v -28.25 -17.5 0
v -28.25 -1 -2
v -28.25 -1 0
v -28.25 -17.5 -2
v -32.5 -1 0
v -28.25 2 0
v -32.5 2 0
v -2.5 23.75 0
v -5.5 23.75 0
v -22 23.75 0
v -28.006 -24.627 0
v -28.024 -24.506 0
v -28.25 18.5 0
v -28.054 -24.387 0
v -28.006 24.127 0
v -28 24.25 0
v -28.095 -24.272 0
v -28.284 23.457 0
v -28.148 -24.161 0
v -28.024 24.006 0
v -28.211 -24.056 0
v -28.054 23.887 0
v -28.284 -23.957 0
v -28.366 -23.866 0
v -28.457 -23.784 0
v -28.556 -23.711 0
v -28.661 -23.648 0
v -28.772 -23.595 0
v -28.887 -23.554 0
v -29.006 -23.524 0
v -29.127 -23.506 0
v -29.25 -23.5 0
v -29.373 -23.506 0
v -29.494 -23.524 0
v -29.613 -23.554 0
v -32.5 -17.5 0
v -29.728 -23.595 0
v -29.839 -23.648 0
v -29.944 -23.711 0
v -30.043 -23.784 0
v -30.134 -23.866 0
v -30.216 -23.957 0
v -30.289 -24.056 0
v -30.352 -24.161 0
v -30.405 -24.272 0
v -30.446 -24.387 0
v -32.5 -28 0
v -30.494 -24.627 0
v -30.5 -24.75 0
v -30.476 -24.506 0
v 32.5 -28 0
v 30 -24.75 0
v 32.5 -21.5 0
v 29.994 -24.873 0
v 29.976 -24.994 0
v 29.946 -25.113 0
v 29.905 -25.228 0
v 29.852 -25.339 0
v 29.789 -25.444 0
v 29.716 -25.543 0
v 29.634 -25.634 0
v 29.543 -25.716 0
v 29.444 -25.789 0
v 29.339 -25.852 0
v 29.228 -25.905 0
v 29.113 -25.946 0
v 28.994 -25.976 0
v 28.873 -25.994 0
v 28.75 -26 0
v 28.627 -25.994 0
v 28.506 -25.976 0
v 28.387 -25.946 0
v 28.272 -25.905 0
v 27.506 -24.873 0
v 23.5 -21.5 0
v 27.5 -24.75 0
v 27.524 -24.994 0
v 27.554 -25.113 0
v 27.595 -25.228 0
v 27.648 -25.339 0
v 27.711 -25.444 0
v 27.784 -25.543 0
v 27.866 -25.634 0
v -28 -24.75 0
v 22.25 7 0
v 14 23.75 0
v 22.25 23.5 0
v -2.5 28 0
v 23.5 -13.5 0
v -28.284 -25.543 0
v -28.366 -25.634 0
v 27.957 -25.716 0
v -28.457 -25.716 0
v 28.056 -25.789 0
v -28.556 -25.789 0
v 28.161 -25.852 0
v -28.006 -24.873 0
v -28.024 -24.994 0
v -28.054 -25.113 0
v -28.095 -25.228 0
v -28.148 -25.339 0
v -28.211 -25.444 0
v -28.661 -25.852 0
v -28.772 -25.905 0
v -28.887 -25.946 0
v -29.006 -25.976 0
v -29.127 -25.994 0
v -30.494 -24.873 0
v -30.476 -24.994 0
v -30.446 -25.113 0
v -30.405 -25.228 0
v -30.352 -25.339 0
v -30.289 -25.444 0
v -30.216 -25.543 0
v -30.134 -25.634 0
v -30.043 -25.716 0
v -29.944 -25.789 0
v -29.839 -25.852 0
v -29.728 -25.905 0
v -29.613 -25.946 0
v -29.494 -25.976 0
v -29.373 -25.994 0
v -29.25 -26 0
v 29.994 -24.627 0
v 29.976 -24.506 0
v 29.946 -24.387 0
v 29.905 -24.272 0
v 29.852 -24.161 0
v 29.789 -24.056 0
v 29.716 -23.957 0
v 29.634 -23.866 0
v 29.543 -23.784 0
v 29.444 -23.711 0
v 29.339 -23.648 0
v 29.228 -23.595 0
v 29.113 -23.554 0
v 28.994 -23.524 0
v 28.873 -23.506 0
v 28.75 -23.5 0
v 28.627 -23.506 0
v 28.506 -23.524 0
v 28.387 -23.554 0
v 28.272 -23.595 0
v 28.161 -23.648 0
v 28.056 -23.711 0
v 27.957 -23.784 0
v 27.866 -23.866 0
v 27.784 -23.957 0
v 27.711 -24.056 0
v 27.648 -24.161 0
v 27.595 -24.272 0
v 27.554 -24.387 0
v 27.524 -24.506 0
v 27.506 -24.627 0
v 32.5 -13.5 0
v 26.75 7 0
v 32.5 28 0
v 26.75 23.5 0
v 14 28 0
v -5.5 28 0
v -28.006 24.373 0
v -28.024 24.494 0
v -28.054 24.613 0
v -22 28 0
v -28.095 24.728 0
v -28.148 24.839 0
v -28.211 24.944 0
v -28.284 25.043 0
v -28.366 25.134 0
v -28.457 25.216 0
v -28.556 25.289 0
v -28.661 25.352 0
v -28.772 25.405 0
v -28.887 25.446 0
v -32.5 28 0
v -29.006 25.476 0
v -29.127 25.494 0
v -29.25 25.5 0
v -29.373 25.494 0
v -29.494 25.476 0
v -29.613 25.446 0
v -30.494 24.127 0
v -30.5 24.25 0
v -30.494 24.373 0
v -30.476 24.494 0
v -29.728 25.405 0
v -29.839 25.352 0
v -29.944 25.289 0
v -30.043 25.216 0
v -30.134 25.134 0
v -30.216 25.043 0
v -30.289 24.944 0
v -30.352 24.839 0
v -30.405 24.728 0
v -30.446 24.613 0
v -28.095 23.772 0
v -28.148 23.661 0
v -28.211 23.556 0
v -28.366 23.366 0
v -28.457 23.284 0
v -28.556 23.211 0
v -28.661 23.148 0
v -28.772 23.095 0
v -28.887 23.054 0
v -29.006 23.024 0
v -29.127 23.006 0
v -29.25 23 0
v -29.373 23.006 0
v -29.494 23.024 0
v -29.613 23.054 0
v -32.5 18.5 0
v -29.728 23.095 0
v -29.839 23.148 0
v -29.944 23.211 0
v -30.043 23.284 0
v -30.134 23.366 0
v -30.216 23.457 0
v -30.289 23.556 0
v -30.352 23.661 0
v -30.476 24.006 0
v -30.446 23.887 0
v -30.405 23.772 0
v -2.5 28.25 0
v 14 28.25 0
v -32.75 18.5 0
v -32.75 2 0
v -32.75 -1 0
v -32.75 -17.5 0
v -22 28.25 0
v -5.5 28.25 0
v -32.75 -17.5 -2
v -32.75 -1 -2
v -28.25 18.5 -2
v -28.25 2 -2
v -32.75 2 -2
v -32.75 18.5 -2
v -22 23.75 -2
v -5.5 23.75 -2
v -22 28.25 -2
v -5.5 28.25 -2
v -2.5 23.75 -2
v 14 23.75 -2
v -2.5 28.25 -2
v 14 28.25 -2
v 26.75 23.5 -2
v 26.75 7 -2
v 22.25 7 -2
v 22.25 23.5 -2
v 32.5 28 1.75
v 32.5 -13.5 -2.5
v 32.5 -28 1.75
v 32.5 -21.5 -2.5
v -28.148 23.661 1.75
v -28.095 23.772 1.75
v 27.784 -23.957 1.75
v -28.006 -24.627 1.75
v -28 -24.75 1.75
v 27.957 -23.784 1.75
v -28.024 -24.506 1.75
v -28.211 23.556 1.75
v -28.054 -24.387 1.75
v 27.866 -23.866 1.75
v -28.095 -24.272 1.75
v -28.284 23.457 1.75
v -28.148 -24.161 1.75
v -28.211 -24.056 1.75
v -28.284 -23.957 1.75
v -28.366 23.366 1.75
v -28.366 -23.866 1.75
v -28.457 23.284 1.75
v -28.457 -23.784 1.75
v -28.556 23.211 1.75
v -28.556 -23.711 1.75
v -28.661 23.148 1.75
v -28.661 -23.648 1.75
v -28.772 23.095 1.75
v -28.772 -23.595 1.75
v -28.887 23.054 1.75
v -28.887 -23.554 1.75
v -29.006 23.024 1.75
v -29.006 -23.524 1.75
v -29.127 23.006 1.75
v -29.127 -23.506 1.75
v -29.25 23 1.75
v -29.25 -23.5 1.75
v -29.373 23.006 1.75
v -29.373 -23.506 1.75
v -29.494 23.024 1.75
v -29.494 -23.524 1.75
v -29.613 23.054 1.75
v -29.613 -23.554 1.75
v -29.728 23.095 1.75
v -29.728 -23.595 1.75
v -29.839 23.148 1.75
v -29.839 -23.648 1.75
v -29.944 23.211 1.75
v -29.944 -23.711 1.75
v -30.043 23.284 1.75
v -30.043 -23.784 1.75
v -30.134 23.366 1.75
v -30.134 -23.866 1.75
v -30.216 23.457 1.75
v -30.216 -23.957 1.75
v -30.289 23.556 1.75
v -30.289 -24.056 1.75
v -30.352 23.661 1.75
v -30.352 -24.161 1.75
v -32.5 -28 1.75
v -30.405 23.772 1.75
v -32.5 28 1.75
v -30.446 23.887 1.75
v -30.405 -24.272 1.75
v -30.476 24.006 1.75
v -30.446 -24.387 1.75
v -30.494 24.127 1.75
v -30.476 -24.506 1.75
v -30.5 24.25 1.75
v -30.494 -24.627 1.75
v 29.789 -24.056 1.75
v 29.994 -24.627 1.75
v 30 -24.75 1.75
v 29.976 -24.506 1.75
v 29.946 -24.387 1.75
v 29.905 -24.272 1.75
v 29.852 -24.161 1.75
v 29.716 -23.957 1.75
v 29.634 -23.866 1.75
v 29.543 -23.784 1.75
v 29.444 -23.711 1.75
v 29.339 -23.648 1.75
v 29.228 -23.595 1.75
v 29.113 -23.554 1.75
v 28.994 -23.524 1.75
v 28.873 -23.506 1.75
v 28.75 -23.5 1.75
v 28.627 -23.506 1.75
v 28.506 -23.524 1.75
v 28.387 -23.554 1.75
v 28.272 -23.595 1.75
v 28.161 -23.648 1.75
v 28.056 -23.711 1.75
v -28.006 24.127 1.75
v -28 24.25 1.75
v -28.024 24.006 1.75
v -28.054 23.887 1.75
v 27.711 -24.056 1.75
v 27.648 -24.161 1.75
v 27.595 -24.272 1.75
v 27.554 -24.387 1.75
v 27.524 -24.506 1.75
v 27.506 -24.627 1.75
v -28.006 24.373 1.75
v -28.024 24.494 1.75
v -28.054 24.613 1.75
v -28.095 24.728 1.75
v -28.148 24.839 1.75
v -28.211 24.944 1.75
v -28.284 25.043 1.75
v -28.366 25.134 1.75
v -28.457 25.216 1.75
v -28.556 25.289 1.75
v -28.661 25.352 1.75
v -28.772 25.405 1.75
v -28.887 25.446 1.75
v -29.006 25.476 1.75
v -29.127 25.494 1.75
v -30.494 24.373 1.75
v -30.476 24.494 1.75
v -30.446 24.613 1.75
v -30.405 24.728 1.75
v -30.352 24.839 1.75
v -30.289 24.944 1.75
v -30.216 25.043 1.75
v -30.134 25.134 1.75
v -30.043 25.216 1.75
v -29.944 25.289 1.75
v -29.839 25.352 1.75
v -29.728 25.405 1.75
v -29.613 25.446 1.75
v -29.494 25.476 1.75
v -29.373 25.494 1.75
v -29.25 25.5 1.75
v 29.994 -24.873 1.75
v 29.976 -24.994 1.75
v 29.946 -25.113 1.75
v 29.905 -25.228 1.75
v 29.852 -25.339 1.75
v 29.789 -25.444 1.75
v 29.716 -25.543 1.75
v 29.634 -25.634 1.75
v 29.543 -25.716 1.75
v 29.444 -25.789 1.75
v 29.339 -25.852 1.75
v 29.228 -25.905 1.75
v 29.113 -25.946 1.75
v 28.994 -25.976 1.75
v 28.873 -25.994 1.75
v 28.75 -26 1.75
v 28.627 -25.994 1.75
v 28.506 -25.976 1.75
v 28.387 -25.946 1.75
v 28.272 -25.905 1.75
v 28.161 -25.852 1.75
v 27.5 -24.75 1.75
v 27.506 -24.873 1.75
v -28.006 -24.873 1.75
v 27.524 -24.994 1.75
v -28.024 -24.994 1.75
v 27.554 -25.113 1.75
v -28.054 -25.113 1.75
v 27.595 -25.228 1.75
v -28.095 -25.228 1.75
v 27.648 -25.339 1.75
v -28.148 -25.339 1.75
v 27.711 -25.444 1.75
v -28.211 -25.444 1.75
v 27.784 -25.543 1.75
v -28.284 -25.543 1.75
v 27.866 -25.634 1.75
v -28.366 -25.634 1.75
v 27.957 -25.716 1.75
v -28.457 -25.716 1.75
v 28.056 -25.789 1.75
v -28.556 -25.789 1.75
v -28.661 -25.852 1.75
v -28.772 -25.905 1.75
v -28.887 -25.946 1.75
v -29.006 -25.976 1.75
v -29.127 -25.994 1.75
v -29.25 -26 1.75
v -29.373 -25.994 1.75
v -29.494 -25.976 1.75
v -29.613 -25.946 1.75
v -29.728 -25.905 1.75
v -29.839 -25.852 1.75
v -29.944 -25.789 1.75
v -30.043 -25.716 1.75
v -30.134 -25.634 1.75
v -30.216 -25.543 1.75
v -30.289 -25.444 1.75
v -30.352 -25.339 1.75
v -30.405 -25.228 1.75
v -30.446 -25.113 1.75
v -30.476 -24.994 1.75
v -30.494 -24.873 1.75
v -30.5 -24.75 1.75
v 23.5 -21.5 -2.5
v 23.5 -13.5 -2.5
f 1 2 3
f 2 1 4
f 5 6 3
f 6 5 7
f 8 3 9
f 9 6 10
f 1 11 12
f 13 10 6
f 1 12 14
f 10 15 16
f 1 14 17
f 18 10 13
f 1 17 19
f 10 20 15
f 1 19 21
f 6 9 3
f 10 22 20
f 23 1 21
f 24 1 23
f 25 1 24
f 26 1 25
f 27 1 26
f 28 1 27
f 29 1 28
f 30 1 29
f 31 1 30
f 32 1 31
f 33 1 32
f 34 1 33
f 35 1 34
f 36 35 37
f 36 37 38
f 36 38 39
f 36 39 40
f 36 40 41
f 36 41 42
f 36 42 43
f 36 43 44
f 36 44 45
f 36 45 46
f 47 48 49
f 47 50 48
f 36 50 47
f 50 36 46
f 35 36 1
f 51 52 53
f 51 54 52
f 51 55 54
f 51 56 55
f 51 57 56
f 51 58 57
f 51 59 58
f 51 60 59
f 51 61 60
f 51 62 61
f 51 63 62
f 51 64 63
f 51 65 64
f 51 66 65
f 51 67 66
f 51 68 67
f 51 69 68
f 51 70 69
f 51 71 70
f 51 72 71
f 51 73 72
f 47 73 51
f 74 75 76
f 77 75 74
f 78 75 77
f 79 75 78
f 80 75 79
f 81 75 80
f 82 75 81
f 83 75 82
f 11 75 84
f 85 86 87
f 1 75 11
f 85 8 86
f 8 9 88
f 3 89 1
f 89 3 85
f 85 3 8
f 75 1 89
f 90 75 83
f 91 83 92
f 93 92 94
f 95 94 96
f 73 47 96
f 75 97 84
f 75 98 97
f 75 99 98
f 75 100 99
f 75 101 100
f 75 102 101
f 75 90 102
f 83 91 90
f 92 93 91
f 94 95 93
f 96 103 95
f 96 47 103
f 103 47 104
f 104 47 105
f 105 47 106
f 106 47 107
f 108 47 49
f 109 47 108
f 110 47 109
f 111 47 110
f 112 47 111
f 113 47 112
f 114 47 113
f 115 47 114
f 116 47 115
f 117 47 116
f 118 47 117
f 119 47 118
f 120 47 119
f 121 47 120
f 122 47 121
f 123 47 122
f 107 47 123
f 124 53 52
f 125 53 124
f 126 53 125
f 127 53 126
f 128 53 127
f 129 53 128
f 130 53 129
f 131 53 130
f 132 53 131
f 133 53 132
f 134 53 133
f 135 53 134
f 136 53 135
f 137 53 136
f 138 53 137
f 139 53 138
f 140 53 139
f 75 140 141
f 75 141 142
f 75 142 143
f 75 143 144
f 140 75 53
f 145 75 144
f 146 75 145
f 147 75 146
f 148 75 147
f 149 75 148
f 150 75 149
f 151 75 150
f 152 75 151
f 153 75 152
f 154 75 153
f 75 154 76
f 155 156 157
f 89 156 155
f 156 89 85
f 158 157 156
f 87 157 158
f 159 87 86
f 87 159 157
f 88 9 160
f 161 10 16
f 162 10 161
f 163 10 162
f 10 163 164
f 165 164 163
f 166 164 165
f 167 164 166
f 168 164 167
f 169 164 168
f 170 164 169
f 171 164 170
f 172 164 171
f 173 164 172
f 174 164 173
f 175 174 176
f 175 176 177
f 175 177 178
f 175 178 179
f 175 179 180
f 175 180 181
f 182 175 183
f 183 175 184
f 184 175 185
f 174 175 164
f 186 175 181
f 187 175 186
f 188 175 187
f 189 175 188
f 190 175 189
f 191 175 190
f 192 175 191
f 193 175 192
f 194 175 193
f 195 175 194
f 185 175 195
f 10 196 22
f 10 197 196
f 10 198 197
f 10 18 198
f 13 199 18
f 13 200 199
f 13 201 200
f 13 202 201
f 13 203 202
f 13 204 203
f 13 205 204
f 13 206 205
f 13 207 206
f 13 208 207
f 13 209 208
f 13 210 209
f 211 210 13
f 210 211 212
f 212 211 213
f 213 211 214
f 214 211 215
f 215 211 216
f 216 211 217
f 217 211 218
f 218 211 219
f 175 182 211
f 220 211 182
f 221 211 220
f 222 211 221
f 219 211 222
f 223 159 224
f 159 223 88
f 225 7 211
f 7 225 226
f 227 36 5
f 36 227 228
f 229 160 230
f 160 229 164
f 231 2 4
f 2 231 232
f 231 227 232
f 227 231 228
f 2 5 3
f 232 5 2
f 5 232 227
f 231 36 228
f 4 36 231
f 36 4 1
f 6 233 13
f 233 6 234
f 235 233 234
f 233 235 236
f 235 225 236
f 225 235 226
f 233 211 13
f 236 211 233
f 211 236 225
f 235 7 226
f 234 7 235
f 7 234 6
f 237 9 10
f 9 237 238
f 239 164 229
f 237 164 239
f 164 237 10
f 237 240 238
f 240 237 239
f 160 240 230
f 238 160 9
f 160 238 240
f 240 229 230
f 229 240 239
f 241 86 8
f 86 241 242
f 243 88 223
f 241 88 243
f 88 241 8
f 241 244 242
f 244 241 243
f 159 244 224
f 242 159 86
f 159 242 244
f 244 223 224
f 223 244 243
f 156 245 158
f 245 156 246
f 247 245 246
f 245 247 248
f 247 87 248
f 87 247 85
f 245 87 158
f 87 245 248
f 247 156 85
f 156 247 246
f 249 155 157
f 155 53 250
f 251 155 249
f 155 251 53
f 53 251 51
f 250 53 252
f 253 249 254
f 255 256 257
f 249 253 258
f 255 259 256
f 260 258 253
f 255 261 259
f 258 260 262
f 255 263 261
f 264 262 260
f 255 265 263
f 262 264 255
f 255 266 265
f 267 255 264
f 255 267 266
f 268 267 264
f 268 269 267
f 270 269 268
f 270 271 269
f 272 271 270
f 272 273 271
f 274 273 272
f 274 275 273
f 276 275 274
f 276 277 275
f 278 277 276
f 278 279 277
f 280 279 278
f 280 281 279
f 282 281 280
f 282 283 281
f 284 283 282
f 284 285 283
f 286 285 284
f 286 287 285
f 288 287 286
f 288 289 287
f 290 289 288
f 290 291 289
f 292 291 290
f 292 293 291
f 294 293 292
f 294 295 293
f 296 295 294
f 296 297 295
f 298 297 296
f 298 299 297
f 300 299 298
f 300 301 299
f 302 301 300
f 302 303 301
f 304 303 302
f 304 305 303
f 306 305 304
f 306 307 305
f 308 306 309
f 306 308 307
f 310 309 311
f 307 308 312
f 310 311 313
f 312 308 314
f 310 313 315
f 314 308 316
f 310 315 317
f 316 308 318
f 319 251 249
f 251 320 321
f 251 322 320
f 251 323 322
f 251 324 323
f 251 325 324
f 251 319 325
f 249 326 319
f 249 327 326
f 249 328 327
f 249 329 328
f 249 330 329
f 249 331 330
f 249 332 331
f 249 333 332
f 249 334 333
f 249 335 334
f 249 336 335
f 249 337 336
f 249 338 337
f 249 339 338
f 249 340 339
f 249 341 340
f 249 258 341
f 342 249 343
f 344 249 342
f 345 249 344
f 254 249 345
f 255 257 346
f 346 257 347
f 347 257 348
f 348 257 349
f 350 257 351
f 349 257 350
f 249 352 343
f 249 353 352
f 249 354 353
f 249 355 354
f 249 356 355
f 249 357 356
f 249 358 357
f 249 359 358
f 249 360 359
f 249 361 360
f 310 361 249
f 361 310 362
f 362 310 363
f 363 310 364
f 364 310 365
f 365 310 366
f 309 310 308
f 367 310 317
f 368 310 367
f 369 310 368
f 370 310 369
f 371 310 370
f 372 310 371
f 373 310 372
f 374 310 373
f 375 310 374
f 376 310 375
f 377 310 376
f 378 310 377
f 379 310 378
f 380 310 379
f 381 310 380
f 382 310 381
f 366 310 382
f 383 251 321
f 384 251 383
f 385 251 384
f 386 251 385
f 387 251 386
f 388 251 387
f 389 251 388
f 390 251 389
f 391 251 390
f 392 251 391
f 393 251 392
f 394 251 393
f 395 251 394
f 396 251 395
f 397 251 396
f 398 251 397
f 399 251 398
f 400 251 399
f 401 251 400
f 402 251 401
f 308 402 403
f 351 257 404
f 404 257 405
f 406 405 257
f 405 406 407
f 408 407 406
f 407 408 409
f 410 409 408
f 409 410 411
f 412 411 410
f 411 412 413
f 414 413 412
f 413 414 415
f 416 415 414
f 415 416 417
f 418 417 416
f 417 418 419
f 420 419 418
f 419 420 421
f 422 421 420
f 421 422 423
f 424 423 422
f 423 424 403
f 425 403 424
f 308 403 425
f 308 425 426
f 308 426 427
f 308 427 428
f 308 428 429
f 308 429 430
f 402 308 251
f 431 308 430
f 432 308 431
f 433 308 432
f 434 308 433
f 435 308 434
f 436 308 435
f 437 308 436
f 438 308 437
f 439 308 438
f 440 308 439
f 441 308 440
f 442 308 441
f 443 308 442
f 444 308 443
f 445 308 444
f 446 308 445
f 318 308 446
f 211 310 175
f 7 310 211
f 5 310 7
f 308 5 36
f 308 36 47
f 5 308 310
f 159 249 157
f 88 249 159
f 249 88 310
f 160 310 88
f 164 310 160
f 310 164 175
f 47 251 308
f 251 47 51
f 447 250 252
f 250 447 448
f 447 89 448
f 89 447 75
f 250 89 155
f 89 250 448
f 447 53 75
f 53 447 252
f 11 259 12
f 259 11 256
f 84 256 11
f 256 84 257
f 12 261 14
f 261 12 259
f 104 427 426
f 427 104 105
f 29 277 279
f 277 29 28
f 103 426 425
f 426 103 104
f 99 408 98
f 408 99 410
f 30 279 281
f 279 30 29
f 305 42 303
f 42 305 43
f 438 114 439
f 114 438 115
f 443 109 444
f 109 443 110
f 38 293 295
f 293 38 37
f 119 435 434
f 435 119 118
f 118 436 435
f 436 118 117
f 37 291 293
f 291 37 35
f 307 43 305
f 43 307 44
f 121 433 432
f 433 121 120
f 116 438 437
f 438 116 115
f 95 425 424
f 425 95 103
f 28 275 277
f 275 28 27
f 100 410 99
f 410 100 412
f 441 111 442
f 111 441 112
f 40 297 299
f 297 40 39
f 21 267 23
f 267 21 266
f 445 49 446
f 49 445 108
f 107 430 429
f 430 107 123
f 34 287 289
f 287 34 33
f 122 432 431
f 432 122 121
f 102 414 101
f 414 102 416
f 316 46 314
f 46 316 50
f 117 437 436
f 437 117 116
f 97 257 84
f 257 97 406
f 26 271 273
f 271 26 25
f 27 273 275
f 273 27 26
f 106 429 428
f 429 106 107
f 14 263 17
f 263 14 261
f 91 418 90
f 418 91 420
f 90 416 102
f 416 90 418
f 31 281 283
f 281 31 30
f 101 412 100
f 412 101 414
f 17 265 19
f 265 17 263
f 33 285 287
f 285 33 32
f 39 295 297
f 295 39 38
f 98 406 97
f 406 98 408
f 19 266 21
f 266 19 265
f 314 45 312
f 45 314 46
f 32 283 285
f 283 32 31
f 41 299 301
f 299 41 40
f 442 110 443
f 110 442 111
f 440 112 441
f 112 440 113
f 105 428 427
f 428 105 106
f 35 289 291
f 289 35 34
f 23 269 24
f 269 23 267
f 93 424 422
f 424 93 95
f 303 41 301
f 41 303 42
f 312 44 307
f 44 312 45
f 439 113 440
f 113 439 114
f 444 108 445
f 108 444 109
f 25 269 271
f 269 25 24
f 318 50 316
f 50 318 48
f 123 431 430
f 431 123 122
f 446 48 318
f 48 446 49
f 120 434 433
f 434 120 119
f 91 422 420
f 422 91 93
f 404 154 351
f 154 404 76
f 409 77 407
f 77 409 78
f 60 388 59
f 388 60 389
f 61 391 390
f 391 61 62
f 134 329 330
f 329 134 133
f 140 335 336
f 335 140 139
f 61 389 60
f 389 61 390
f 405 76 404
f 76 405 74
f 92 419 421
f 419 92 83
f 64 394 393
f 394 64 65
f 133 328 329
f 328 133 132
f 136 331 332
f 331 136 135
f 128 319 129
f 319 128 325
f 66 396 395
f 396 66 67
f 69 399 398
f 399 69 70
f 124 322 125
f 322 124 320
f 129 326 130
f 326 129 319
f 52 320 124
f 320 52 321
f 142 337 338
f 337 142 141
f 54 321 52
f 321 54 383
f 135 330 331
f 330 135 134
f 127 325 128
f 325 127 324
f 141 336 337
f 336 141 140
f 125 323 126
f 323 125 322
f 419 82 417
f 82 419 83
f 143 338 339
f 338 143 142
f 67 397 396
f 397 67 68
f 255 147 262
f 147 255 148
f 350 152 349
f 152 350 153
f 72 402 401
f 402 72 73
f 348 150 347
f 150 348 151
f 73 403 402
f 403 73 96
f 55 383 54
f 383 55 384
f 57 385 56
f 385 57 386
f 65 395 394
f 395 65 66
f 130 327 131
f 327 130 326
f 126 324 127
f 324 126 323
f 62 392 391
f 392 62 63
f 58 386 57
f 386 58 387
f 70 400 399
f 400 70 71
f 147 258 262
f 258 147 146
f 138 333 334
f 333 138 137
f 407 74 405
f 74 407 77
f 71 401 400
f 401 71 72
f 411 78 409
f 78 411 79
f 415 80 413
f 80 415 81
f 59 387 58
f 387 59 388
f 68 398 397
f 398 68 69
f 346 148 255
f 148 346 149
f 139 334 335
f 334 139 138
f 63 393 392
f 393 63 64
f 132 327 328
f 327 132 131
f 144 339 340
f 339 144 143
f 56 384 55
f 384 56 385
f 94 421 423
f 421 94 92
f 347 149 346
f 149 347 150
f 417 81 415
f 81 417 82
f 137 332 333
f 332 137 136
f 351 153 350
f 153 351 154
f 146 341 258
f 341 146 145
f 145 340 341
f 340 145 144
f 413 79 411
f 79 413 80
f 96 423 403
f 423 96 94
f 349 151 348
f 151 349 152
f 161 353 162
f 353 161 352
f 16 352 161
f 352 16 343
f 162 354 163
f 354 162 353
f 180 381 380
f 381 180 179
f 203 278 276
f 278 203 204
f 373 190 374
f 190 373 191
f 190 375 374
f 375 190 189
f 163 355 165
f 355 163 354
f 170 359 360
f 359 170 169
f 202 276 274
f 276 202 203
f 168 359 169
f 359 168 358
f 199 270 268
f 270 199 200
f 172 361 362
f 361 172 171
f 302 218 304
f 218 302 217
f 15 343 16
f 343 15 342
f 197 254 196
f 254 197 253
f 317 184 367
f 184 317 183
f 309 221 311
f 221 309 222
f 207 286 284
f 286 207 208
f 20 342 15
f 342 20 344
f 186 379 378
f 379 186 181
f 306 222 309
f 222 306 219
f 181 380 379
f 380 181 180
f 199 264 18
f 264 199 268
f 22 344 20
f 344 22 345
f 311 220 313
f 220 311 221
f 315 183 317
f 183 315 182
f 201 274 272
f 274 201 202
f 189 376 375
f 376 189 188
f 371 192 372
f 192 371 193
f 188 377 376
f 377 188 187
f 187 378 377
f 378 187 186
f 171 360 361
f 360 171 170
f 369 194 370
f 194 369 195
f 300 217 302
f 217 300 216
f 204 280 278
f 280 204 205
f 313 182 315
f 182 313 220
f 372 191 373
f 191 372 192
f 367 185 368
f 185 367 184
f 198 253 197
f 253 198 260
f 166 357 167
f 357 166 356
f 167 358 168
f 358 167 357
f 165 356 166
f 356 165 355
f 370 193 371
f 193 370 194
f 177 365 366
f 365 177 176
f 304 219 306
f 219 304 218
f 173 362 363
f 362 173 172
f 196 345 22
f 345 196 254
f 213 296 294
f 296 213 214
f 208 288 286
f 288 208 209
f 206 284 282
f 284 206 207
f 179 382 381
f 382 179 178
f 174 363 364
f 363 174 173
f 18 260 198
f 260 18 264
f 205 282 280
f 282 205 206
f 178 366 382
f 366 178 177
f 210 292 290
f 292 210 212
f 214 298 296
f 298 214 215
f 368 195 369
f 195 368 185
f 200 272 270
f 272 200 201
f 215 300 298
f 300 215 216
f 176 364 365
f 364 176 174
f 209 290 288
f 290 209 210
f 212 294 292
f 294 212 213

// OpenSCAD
// Arducam Camarray HAT UC-512 (parametric, 3-hole version)
// Origin: PCB centered at (0,0); bottom at Z=0.

module hat_uc512(
    pcb   = [65, 56, 1.75],     // [L, W, T] mm
    hd    = 2.5,                // hole diameter
    // Three hole centers given from LOWER-LEFT PCB corner (mm):
    // Default = triangular pattern: (ox,oy), (ox+px,oy), (ox,oy+py)
    holes = [ [2.25,2.25], [58,2.25], [2.25,49.0] ],
    show_keepout = false,       // draw keep-outs above PCB?
    ko    = [3.5, 5.0],         // [keep-out diameter, height]
    pcb_col = "#177245",
    $fn = 64
){
    // Unpack
    L = pcb[0]; W = pcb[1]; T = pcb[2];
    ko_d = ko[0]; ko_h = ko[1];

    // Convert lower-left based coords -> centered-origin coords
    function to_center(p) = [ p[0] - L/2, p[1] - W/2 ];

    // --- PCB plate ---
    module pcb_plate(){
        color(pcb_col)
        translate([-L/2, -W/2, 0])
            cube([L, W, T], center=false);
    }
    
    // --- MiPi connectors ---
    mipi_size = [4.5,16.5,2];
    mipi_offset = mipi_size[1]/2;
    mipi = [ [2,27-mipi_offset], [2,46.5-mipi_offset], [27-mipi_offset,54], [46.5-mipi_offset,54], [57,51.5-mipi_offset] ];
    mipi_rotate = [0, 0, 1, 1, 0];
    module mipi_connectors(){
        color("#808080")
        for (i = [0:len(mipi)-1]) {
            p = to_center(mipi[i]);
            translate([p[0], p[1], -1])
                rotate([0, 0, mipi_rotate[i] * 90])
                    cube(mipi_size, center = true);
        }
    }
    
    // --- USB power ---
    module usb_power(){
        color("#808080")
        translate([28, -17.5, -1])
        cube([9,8,3], center = true);
    }

    // --- Geometry ---
    difference(){
        union(){
            pcb_plate();
            mipi_connectors();
            usb_power();
        }

        // Drill exactly 3 holes (robust to any 3-length list)
        for (i = [0:len(holes)-1]) {
            p = to_center(holes[i]);
            translate([p[0], p[1], -0.1])
                cylinder(d=hd, h=T+0.2);
        }
    }

    // Optional keep-outs
    if (show_keepout)
        for (i = [0 : min(2, len(holes)-1)]) {
            p = to_center(holes[i]);
            color([1,0,0,0.25])
            translate([p[0], p[1], T])
                cylinder(d=ko_d, h=ko_h);
        }
}

// --- Examples (comment out in library file) ---
 hat_uc512(
   pcb=[65, 56, 1.75],
   hd=2.5,
   holes=[ [3.25,3.25], [58+3.25,3.25], [3.25,49.0+3.25] ],
   show_keepout=false,
   ko=[4,6]
 );
